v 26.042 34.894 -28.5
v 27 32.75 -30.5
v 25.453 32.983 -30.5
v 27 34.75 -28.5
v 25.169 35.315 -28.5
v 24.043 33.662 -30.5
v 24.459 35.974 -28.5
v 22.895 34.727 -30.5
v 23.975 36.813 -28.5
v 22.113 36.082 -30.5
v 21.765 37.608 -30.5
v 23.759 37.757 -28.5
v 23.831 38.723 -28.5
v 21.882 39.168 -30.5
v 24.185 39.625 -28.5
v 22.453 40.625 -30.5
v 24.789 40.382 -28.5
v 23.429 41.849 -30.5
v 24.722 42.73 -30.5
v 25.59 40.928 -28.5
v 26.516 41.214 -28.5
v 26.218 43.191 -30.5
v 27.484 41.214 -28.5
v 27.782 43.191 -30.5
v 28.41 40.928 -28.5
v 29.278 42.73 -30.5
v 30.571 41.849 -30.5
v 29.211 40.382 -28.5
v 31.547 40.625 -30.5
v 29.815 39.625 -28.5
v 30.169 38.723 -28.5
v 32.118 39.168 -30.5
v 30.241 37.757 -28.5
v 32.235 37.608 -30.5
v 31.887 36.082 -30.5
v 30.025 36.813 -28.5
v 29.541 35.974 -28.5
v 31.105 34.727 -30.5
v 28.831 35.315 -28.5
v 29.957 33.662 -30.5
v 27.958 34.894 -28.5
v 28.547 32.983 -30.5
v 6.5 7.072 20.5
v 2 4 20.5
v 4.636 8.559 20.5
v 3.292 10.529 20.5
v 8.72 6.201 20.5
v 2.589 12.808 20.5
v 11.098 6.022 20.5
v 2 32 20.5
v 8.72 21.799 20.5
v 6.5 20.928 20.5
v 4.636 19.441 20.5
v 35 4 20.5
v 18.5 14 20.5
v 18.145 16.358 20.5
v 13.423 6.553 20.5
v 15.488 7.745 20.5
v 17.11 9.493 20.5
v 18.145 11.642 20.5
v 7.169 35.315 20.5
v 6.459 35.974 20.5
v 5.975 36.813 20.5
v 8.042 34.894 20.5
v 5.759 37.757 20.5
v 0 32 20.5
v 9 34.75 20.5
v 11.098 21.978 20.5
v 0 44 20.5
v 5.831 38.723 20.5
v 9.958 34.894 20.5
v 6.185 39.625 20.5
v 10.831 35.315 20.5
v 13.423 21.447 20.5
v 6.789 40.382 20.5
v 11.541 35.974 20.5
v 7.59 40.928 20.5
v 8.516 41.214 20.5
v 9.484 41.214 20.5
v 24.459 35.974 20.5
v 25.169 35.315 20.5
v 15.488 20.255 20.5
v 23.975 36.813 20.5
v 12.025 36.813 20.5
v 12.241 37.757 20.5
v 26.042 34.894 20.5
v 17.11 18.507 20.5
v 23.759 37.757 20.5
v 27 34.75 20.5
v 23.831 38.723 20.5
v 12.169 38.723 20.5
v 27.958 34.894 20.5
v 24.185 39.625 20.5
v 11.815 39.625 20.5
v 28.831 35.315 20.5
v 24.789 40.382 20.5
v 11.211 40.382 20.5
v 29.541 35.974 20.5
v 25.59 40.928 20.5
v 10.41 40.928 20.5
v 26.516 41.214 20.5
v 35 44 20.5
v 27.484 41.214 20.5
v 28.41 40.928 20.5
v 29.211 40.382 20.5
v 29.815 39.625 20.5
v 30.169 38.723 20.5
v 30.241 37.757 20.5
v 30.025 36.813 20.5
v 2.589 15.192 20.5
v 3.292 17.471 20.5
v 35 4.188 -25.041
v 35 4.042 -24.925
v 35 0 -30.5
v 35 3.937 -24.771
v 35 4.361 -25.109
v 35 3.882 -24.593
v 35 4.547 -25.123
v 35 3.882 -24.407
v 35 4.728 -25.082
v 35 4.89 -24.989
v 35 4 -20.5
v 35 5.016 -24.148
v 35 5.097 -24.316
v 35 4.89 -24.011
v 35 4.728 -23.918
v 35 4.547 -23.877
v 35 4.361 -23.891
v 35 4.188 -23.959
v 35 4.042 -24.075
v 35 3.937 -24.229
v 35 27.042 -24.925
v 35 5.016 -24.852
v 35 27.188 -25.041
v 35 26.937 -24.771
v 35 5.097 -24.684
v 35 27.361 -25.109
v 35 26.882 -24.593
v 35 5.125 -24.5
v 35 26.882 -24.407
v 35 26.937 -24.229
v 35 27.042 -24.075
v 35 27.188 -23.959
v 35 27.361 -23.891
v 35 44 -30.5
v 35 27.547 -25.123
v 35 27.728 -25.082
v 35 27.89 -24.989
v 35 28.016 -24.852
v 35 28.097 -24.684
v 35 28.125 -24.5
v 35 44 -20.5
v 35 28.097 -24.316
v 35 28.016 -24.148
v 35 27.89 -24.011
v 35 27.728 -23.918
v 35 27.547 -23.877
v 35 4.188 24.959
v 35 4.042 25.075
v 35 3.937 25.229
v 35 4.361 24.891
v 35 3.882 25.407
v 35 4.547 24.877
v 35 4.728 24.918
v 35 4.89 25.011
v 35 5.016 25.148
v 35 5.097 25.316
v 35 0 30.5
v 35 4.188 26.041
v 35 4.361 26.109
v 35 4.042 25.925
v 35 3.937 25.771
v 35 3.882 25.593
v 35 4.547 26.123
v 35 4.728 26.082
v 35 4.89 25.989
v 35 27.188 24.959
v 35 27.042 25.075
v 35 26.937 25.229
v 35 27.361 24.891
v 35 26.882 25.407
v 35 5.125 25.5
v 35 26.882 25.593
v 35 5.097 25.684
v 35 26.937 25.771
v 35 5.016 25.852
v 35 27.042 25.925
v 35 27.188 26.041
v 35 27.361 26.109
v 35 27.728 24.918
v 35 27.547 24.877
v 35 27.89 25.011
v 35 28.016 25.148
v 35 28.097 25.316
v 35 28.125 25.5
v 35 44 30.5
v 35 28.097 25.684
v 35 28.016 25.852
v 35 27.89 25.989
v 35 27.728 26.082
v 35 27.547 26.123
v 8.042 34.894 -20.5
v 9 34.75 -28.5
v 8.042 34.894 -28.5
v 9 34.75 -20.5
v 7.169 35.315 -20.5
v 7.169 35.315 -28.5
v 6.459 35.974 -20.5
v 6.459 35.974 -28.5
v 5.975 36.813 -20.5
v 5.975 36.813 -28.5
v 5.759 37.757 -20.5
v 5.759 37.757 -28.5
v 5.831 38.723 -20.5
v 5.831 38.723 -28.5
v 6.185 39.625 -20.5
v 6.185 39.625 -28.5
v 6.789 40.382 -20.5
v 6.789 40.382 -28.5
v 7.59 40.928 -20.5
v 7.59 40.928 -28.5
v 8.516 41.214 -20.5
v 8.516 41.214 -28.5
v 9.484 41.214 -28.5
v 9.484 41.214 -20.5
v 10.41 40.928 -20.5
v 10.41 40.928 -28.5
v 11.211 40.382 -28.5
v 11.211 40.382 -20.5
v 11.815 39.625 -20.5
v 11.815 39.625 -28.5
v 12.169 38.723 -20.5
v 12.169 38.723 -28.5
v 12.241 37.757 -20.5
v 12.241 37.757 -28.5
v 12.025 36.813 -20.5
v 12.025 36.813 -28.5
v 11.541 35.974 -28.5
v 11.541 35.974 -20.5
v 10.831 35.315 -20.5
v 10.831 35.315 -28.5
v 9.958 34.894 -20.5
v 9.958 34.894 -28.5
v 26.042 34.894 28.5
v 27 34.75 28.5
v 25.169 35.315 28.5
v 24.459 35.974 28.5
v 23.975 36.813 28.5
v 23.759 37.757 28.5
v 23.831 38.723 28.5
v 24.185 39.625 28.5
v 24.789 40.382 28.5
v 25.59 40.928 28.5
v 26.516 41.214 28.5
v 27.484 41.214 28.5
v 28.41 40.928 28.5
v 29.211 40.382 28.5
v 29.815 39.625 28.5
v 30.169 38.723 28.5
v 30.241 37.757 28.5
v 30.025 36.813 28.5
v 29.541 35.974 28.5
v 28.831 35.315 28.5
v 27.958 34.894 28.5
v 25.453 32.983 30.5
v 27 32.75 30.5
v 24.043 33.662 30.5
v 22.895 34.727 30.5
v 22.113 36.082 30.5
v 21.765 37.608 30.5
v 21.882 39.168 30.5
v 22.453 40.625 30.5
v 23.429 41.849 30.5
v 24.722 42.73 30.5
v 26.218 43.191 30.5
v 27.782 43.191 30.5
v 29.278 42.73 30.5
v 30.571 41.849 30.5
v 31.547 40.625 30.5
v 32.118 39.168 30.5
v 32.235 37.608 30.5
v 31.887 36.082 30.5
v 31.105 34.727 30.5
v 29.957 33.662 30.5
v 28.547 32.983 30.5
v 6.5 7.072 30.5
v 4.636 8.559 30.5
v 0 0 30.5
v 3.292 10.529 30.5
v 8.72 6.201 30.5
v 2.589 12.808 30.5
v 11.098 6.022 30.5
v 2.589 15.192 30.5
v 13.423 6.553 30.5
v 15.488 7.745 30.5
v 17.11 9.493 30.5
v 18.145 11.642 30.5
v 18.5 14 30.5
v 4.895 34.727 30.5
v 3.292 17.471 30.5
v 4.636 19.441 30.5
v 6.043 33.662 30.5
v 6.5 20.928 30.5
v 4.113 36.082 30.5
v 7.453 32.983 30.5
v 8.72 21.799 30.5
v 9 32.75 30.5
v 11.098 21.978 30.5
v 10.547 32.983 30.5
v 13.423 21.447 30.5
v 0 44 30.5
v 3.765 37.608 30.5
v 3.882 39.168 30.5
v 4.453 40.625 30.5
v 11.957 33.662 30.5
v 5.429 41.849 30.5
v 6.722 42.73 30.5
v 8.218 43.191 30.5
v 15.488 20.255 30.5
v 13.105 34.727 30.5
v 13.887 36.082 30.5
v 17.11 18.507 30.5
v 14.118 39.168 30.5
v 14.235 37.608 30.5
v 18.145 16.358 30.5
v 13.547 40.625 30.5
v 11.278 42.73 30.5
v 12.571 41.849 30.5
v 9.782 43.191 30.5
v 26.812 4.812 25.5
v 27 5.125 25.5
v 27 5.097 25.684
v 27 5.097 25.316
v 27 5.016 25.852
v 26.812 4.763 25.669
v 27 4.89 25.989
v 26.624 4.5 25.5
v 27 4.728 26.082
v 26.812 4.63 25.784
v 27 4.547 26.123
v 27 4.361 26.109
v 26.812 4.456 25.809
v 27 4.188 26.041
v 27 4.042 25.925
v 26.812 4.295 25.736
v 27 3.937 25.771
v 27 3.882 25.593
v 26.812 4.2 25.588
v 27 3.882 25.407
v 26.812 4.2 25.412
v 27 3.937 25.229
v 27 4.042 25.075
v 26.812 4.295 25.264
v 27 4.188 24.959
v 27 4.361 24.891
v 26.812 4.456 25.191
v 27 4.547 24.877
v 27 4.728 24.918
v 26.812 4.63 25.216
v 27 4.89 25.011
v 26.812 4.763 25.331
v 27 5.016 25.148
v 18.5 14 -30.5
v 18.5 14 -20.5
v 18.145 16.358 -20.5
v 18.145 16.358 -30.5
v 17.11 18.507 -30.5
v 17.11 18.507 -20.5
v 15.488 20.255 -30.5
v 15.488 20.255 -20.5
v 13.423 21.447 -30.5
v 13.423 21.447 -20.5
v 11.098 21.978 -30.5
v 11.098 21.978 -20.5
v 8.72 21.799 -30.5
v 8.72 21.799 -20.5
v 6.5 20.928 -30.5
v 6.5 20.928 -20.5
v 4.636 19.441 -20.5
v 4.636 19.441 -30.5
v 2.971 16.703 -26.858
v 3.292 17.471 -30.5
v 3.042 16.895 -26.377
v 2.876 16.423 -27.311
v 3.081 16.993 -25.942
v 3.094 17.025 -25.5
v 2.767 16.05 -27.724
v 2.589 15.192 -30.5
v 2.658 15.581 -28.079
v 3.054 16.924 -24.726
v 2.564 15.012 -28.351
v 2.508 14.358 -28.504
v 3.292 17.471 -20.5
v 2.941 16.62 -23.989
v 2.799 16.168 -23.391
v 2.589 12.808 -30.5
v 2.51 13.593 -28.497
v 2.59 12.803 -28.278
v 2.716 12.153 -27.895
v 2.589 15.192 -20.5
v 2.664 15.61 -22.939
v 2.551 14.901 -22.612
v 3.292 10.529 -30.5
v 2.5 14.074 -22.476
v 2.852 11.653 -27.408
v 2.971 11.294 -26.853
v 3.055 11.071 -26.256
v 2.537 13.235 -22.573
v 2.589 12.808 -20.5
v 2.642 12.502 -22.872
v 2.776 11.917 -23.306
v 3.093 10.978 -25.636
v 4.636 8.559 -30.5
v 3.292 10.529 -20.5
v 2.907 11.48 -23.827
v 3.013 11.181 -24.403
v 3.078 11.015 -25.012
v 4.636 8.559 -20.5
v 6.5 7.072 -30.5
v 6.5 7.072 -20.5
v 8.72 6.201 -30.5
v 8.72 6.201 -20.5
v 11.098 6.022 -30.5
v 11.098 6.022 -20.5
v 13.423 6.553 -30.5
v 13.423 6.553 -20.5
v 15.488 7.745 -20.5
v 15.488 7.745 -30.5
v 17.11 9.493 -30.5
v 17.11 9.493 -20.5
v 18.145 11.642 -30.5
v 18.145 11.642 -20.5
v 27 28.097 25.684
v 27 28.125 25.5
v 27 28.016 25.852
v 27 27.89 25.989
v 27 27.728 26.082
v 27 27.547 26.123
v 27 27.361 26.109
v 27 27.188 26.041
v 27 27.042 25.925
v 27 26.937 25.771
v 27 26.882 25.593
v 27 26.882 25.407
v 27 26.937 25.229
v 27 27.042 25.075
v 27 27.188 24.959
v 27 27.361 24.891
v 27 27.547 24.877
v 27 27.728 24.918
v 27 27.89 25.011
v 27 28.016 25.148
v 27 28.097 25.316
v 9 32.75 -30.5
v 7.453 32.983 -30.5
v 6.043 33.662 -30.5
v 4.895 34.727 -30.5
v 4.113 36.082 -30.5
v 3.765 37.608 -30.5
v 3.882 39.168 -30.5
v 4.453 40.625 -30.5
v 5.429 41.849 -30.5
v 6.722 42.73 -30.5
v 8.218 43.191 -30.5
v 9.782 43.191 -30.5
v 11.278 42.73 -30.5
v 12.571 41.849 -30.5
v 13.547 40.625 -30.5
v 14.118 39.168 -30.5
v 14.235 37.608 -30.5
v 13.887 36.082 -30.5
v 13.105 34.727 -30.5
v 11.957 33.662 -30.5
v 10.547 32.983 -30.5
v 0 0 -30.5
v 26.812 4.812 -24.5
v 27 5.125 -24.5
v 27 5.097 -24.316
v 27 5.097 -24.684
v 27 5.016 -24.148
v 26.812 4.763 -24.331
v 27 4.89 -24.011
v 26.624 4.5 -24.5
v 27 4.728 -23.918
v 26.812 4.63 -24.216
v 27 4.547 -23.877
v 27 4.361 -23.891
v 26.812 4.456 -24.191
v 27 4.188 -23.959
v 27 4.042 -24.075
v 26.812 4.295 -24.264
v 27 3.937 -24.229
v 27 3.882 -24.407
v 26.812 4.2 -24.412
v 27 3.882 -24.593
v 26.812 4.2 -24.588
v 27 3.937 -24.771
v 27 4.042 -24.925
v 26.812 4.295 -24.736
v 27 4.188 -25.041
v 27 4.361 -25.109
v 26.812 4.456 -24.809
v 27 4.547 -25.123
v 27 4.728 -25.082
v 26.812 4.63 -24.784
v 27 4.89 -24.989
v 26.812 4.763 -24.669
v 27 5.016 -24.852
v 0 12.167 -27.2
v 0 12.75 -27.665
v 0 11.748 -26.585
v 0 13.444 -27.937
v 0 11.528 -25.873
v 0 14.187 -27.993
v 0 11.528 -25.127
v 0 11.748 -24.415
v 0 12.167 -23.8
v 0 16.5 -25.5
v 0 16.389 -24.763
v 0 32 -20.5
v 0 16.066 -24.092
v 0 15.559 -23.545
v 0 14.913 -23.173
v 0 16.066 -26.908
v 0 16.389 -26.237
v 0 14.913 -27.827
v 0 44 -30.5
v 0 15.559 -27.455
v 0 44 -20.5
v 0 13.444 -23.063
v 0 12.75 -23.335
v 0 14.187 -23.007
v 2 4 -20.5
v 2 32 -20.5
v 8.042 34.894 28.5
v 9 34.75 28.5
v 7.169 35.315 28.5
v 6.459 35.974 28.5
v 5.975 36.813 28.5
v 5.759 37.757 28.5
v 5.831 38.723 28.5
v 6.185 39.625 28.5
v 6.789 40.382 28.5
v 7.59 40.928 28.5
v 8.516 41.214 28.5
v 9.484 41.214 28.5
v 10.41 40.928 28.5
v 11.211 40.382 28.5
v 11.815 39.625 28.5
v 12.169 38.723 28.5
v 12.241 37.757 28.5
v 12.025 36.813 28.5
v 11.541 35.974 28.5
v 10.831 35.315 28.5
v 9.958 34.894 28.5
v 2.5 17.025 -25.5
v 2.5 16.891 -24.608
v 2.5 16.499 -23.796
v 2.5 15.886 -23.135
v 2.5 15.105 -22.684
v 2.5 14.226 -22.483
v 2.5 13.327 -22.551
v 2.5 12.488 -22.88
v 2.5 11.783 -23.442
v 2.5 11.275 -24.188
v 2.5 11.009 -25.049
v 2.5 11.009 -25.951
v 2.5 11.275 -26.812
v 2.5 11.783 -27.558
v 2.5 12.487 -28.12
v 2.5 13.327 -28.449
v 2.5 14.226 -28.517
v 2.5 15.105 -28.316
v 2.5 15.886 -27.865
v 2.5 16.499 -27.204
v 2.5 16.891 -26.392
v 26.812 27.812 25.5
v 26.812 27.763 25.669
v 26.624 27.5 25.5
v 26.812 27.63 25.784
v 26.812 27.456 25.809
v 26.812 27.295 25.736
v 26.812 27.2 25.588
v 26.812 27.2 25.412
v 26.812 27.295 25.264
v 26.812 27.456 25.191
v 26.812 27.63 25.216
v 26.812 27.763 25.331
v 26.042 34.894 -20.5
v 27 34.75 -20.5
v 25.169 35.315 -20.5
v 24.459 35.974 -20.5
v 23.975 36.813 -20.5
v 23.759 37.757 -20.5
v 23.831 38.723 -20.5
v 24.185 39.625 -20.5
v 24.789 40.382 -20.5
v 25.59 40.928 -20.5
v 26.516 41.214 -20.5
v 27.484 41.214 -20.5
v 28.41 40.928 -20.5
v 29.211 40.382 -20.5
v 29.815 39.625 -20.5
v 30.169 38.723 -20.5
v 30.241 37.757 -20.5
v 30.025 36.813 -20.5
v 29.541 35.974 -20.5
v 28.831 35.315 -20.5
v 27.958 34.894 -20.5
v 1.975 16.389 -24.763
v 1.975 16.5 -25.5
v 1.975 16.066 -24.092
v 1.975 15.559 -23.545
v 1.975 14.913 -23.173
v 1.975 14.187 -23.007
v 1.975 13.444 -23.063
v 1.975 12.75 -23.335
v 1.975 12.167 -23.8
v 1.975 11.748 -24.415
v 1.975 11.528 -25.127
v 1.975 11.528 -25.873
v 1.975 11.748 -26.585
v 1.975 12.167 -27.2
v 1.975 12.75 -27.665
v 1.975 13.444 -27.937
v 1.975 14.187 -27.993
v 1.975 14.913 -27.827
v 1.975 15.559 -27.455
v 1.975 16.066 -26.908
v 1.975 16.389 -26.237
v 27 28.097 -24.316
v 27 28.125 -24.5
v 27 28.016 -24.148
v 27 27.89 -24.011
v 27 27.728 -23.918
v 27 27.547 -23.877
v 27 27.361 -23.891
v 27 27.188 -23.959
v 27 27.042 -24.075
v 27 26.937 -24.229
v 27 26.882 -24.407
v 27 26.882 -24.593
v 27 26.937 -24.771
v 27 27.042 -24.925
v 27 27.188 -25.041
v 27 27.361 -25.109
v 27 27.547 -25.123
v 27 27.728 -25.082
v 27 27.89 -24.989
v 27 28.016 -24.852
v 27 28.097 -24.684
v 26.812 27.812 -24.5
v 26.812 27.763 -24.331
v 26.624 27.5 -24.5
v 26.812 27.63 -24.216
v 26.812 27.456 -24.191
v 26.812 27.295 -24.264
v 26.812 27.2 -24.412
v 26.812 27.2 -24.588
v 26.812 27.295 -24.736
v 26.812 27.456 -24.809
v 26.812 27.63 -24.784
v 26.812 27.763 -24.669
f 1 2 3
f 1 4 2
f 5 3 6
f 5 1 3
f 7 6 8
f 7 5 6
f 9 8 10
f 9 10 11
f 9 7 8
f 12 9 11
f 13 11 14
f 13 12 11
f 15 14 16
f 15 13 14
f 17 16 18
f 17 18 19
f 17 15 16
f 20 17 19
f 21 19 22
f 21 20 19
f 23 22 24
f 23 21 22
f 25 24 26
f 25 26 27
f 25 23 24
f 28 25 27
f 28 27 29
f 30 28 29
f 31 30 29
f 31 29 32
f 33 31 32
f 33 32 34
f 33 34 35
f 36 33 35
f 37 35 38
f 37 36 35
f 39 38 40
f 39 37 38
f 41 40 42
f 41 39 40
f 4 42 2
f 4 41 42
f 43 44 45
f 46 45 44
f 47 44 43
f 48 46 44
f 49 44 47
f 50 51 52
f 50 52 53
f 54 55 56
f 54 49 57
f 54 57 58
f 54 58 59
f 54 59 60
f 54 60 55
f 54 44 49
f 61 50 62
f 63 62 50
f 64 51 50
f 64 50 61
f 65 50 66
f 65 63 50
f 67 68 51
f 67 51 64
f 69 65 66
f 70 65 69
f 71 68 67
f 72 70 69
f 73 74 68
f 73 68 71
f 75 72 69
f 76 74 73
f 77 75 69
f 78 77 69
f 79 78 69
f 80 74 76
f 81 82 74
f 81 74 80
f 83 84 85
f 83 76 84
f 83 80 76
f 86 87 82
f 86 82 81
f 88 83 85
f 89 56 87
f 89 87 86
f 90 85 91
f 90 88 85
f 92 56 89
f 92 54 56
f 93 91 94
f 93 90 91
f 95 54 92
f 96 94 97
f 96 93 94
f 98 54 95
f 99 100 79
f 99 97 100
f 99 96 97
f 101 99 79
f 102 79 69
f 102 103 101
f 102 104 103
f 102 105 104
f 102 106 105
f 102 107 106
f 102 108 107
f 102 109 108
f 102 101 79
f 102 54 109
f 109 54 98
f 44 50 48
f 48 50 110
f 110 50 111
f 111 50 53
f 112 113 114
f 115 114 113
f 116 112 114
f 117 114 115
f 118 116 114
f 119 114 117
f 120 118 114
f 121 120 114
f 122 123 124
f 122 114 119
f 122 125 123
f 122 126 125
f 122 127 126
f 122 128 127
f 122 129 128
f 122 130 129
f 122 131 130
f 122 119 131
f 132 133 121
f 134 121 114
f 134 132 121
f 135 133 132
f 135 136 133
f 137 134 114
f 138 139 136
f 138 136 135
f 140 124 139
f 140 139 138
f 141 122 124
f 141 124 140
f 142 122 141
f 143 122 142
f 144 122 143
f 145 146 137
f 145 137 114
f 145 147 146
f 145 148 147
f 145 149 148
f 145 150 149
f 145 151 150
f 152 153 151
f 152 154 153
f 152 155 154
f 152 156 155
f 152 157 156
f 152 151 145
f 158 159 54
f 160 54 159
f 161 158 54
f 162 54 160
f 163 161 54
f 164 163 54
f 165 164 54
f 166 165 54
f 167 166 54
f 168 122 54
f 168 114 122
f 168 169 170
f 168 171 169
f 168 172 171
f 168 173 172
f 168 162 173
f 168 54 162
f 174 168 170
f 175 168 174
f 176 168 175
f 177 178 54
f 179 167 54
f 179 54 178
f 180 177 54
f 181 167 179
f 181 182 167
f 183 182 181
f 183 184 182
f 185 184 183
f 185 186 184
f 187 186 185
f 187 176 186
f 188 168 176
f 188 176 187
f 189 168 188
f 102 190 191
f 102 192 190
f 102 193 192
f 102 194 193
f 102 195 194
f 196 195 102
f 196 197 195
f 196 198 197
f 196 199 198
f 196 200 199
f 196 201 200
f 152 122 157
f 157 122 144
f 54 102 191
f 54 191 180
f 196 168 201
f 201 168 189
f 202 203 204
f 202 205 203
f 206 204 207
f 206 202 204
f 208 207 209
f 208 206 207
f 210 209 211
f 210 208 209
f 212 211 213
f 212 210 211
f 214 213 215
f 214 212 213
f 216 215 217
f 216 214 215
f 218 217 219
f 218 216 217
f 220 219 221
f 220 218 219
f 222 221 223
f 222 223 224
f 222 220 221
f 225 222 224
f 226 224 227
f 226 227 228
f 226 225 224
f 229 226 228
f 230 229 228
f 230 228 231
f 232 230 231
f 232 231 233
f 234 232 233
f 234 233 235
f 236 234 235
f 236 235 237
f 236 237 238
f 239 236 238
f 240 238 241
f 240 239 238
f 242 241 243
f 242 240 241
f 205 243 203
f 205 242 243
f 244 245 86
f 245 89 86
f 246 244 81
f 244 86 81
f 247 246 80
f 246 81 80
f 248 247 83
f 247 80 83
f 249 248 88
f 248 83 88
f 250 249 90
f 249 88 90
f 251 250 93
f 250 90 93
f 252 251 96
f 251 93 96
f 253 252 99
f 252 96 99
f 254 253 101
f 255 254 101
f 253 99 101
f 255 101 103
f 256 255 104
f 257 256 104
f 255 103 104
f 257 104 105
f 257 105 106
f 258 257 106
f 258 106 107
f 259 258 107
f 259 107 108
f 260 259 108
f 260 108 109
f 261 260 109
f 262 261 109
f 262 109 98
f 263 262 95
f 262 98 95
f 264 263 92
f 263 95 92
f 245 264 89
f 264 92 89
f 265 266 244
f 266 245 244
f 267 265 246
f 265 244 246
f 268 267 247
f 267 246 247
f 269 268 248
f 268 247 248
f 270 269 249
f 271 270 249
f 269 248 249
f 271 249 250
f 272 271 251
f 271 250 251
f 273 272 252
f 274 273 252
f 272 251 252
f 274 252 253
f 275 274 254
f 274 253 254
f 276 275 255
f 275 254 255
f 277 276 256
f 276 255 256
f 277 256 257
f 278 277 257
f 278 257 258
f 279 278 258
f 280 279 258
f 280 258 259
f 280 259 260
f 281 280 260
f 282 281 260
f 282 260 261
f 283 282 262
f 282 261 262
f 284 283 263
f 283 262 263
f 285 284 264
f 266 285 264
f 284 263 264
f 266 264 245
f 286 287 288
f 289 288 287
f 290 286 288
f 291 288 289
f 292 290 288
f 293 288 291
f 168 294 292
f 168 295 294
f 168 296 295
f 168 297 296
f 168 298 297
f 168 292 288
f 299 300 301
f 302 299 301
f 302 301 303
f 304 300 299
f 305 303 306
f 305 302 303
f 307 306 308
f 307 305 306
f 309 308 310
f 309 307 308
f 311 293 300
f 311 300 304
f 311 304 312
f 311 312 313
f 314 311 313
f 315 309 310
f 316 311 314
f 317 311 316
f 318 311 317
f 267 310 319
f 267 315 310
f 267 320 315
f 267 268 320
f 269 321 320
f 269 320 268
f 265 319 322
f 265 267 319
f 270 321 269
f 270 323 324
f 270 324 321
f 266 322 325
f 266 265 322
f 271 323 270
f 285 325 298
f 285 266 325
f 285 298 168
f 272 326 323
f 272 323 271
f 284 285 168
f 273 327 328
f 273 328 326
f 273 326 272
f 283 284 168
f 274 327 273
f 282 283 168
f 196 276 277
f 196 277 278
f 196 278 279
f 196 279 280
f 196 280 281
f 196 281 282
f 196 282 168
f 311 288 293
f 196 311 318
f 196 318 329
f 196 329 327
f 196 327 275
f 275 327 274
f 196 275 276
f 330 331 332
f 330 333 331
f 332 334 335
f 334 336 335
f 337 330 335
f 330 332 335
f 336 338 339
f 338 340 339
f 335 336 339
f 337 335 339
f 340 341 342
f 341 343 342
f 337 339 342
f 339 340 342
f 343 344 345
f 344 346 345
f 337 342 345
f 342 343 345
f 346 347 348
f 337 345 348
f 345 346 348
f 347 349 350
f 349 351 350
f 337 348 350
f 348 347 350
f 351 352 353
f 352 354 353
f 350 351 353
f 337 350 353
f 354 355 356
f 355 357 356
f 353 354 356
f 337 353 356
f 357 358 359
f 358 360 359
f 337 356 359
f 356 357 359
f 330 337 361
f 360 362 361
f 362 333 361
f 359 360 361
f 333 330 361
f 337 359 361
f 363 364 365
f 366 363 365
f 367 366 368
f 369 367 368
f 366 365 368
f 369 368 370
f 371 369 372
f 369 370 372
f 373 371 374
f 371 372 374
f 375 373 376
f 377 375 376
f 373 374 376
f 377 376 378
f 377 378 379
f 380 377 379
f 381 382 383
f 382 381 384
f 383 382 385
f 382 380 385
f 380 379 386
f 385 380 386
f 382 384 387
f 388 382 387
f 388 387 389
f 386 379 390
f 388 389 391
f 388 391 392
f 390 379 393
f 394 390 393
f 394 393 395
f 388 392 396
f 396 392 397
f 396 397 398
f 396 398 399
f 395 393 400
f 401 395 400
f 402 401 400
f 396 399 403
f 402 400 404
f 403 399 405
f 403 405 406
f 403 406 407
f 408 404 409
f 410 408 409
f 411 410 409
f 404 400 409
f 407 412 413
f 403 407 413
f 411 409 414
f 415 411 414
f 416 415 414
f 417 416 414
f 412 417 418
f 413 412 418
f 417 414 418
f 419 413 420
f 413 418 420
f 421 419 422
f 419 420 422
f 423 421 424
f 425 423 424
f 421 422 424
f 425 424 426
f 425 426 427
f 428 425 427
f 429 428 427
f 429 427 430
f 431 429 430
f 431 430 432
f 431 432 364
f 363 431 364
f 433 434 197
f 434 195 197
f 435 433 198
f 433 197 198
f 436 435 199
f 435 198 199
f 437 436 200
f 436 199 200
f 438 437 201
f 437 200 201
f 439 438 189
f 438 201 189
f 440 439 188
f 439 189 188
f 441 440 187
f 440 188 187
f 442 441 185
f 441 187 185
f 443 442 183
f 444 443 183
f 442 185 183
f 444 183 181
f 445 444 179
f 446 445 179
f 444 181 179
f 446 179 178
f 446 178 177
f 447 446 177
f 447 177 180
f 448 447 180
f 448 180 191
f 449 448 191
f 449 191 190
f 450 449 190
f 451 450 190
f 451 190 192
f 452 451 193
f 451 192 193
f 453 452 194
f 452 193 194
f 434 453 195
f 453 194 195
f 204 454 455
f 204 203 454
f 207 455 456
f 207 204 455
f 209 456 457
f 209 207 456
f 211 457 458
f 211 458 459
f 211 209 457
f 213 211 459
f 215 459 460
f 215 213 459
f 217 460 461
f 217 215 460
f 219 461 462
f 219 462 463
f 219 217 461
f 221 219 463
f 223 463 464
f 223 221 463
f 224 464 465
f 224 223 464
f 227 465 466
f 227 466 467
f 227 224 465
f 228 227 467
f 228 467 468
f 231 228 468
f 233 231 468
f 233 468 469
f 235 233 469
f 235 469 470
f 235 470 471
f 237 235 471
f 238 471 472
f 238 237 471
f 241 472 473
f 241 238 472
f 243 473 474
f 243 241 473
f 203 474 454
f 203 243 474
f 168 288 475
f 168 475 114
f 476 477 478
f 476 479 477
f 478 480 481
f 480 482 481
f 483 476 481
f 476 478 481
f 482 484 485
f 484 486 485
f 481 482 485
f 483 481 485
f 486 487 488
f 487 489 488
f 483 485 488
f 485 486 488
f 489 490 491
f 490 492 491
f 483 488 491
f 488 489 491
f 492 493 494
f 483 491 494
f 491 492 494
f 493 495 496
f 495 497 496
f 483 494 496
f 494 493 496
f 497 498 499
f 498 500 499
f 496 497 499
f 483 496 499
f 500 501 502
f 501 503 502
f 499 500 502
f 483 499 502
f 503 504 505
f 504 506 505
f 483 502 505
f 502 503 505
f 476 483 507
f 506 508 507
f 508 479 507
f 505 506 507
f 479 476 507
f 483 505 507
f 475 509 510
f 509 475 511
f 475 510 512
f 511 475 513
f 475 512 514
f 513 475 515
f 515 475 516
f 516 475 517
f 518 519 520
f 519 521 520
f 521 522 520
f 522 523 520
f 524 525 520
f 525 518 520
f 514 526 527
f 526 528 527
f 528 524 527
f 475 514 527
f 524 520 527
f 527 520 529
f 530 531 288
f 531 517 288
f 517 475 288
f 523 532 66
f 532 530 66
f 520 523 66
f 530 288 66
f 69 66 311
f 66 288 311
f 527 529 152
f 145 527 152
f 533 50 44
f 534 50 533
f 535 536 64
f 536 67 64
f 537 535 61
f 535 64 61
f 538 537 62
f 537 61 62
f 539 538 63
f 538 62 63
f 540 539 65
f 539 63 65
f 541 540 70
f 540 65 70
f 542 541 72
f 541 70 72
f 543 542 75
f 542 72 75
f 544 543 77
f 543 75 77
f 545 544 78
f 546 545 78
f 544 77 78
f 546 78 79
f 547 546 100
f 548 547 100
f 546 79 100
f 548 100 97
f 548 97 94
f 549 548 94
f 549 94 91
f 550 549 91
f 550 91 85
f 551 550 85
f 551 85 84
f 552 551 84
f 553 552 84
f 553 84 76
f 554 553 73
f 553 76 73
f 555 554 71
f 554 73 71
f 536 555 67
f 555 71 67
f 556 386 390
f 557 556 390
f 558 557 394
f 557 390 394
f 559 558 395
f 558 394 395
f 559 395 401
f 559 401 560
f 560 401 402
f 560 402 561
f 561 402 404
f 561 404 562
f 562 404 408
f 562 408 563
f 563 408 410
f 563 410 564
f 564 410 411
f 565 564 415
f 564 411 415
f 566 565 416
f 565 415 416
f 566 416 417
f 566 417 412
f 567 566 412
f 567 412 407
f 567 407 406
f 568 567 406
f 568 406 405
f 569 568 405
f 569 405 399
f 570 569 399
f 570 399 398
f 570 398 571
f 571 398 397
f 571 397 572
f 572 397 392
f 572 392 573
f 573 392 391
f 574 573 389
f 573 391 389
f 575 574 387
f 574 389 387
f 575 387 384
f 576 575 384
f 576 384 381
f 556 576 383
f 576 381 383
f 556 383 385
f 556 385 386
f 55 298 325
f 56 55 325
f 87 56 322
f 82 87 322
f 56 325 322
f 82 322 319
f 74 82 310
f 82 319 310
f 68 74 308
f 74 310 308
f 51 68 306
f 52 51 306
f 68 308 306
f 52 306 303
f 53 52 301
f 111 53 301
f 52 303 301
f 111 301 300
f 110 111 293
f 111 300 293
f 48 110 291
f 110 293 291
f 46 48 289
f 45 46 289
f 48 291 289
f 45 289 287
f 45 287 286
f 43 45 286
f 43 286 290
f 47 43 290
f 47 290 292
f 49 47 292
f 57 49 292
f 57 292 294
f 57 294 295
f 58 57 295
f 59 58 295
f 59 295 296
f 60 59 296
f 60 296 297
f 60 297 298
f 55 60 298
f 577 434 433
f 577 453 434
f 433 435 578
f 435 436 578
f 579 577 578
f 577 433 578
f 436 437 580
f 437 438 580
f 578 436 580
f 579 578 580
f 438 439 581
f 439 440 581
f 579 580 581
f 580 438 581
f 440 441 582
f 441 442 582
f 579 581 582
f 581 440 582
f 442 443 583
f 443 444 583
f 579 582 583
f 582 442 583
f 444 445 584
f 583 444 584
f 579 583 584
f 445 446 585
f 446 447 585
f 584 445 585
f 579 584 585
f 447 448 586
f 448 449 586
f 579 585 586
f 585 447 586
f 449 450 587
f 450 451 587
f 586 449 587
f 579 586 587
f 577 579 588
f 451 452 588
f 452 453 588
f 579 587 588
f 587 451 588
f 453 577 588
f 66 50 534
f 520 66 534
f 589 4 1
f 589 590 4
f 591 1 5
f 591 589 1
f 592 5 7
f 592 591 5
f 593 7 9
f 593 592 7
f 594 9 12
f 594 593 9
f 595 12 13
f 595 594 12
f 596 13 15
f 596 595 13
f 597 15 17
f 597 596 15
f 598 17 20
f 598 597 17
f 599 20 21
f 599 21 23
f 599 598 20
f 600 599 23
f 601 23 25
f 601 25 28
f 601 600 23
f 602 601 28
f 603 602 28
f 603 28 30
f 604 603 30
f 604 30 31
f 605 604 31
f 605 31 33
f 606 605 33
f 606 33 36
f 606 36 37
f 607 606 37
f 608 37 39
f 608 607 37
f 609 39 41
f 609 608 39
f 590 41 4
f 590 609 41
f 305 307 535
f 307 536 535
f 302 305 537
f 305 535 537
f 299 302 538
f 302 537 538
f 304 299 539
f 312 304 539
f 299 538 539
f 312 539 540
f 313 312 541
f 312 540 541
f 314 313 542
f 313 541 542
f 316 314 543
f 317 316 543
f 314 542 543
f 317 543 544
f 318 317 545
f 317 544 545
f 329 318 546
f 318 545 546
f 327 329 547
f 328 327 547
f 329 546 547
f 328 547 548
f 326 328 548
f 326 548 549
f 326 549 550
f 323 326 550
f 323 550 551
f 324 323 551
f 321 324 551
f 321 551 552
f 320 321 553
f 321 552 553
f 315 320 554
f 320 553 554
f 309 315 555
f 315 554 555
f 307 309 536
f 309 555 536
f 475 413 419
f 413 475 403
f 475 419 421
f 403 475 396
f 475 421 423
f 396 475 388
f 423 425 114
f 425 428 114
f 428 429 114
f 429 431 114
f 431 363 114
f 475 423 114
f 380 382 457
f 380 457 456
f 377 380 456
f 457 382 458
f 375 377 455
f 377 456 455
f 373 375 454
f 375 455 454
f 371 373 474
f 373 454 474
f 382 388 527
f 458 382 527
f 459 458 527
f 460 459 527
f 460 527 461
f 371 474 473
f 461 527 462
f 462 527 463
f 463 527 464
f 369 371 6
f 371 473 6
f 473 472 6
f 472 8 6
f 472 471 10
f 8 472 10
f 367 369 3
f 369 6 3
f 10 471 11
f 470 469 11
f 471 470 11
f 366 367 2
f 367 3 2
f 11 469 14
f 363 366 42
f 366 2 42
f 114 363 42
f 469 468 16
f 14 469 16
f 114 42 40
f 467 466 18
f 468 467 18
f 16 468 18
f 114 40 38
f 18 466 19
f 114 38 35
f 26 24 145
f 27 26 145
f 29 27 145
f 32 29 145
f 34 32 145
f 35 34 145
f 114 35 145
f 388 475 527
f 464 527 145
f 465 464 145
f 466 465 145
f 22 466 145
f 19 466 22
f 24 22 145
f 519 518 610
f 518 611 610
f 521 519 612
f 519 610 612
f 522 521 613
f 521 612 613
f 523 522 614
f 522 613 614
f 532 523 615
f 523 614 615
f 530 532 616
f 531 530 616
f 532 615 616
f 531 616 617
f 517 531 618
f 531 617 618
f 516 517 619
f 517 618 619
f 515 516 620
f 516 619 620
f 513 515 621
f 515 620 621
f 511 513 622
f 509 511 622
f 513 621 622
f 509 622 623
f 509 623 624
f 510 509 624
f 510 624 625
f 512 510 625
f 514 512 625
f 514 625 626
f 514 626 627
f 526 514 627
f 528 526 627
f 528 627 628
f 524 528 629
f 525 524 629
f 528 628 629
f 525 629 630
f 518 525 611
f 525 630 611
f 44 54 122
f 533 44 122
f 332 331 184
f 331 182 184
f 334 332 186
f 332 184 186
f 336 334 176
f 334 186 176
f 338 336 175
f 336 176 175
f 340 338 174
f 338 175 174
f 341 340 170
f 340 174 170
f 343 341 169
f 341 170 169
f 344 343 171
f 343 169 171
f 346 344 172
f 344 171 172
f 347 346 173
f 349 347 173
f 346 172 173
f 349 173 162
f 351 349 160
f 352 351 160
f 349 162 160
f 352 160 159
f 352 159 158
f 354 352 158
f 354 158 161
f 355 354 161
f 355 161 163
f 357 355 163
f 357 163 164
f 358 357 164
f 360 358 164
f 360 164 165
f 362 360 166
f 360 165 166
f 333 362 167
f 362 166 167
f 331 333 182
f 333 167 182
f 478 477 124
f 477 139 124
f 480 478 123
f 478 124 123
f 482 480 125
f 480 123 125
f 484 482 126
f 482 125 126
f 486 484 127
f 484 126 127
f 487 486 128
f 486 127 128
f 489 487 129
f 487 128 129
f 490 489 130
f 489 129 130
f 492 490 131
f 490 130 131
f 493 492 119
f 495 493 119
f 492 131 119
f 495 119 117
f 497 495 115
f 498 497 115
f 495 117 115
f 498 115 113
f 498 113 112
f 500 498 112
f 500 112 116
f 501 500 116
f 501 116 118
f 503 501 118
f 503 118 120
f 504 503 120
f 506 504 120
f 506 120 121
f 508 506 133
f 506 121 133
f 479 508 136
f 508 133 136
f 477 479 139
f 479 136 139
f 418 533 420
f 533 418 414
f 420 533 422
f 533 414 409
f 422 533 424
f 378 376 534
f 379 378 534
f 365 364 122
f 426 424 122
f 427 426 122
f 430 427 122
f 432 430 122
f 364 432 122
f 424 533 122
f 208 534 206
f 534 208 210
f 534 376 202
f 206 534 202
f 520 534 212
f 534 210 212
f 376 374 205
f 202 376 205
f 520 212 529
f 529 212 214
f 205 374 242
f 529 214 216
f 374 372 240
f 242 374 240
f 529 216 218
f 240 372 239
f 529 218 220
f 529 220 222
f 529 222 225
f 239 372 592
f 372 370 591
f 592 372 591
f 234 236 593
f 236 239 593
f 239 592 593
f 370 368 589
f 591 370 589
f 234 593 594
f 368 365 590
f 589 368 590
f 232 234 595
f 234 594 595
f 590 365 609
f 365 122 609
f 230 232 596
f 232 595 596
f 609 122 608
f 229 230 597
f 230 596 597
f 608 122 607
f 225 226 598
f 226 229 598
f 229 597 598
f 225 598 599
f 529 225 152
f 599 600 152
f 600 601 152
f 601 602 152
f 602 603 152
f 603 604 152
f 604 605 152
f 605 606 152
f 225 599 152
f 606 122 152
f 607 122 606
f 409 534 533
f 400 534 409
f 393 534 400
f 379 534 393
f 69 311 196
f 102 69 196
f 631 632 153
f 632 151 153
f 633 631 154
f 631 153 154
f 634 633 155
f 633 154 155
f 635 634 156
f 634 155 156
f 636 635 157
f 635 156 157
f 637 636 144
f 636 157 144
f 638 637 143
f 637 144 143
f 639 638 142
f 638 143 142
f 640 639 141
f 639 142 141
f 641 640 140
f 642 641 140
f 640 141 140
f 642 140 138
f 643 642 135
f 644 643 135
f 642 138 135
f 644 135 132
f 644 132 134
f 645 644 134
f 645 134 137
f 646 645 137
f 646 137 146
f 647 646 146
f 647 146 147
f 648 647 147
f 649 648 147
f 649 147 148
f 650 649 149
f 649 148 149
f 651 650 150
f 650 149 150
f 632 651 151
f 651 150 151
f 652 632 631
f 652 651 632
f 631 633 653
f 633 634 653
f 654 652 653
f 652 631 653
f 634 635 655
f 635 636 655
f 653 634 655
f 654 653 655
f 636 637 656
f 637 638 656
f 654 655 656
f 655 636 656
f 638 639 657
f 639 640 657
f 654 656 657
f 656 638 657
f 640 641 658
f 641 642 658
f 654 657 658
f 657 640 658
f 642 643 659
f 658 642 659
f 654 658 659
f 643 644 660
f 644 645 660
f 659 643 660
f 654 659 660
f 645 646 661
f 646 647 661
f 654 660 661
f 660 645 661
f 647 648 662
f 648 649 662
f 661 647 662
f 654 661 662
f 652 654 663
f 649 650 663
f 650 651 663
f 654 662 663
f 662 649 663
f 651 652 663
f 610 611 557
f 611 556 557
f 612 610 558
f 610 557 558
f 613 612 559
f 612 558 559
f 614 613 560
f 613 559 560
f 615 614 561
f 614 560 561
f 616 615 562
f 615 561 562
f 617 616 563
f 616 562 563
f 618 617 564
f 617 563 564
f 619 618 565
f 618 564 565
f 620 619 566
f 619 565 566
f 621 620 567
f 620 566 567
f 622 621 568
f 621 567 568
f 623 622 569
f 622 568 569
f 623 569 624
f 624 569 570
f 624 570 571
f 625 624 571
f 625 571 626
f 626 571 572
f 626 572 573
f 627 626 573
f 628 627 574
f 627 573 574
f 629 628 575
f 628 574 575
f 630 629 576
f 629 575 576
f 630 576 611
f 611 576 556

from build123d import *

# Parameters (mm, degrees)
SKETCH_1_W                       = 35
SKETCH_1_H                       = 44
EXTRUDE_1_DEPTH                  = 30.5
SKETCH_3_W                       = 41
SKETCH_3_H                       = 40
CUT_EXTRUDE_1_DEPTH              = 33
SKETCH_4_W                       = 41
SKETCH_4_H                       = 12
CUT_EXTRUDE_2_DEPTH              = 33
SKETCH_5_R                       = 8
CUT_EXTRUDE_3_DEPTH              = 83.957820608
HOLE_WIZARD_6_5_6_5_1_AT_2_COUNT = 2
HOLE_WIZARD_6_5_6_5_1_AT_2_PITCH = 18


# Read off the part's stored shape, not the designer's step: M1.6 螺纹孔1, M6 螺纹孔1
with BuildPart() as part:
    # 草图1 → 凸台-拉伸1 (new, symmetric)
    with BuildSketch(Plane.XY):
        with Locations((17.5, 22)):
            Rectangle(SKETCH_1_W, SKETCH_1_H)
    extrude(amount=EXTRUDE_1_DEPTH, both=True)

    # 草图3 → 切除-拉伸1 (cut)
    with BuildSketch(Plane(origin=(35, 0, 0), x_dir=(0, 0, -1), z_dir=(1, 0, 0))):
        with Locations((0, 24)):
            Rectangle(SKETCH_3_W, SKETCH_3_H)
    extrude(amount=-CUT_EXTRUDE_1_DEPTH, mode=Mode.SUBTRACT)

    # 草图4 → 切除-拉伸2 (cut)
    with BuildSketch(Plane(origin=(2, 0, 0), x_dir=(0, 0, -1), z_dir=(1, 0, 0))):
        with Locations((0, 38)):
            Rectangle(SKETCH_4_W, SKETCH_4_H)
    extrude(amount=-CUT_EXTRUDE_2_DEPTH, mode=Mode.SUBTRACT)

    # 草图5 → 切除-拉伸3 (cut, through all)
    with BuildSketch(Plane.XY.offset(30.5)):
        with Locations((10.5, 14)):
            Circle(SKETCH_5_R)
    extrude(amount=-CUT_EXTRUDE_3_DEPTH, mode=Mode.SUBTRACT)

    # 草图7 → Ø6.5 (6.5) 直径孔1 (revolve, cut)
    with BuildSketch(Plane(origin=(9, 38, -20.5), x_dir=(0, -1, 0), z_dir=(1, 0, 0))):
        Polygon((0, 0), (0, 10), (5.25, 10), (3.25, 8), (3.25, 0), align=None)
    hole_wizard_6_5_6_5_1 = revolve(axis=Axis((9, 38, -14.15), (0, 0, -1)), mode=Mode.SUBTRACT)

    # Ø6.5 (6.5) 直径孔1 at 2: Ø6.5 (6.5) 直径孔1 ×2
    with Locations(*[(i * HOLE_WIZARD_6_5_6_5_1_AT_2_PITCH, 0, 0) for i in range(1, HOLE_WIZARD_6_5_6_5_1_AT_2_COUNT)]):
        add(hole_wizard_6_5_6_5_1, mode=Mode.SUBTRACT)

    # 镜向1: Ø6.5 (6.5) 直径孔1 across plane
    add(hole_wizard_6_5_6_5_1.mirror(Plane.XY), mode=Mode.SUBTRACT)

    # 镜向1 copy 1 sketch → 镜向1 copy 1 (revolve, cut)
    with BuildSketch(Plane(origin=(27, 38, 20.5), x_dir=(0, -1, 0), z_dir=(1, 0, 0))):
        Polygon((0, 0), (0, -10), (5.25, -10), (3.25, -8), (3.25, 0), align=None)
    revolve(axis=Axis((27, 38, 14.15), (0, 0, -1)), mode=Mode.SUBTRACT)

    # M1.6 螺纹孔1 outline → M1.6 螺纹孔1 (revolve, cut)
    with BuildSketch(Plane(origin=(0, 27.5, 25.5), x_dir=(0, 1, 0), z_dir=(0, 0, -1))):
        Polygon((0, 35), (0, 26.624462113), (0.625, 27), (0.625, 35), align=None)
    revolve(axis=Axis((0, 27.5, 25.5), (1, 0, 0)), mode=Mode.SUBTRACT)

    # Hole Wizard M1.6 _1 2 outline → Hole Wizard M1.6 _1 2 (revolve, cut)
    with BuildSketch(Plane(origin=(0, 4.5, -24.5), x_dir=(0, 1, 0), z_dir=(0, 0, -1))):
        Polygon((0, 35), (0, 26.624462113), (0.625, 27), (0.625, 35), align=None)
    revolve(axis=Axis((0, 4.5, -24.5), (1, 0, 0)), mode=Mode.SUBTRACT)

    # Hole Wizard M1.6 _1 3 outline → Hole Wizard M1.6 _1 3 (revolve, cut)
    with BuildSketch(Plane(origin=(0, 27.5, -24.5), x_dir=(0, 1, 0), z_dir=(0, 0, -1))):
        Polygon((0, 35), (0, 26.624462113), (0.625, 27), (0.625, 35), align=None)
    revolve(axis=Axis((0, 27.5, -24.5), (1, 0, 0)), mode=Mode.SUBTRACT)

    # Hole Wizard M1.6 _1 4 outline → Hole Wizard M1.6 _1 4 (revolve, cut)
    with BuildSketch(Plane(origin=(0, 4.5, 25.5), x_dir=(0, 1, 0), z_dir=(0, 0, -1))):
        Polygon((0, 35), (0, 26.624462113), (0.625, 27), (0.625, 35), align=None)
    revolve(axis=Axis((0, 4.5, 25.5), (1, 0, 0)), mode=Mode.SUBTRACT)

    # M6 螺纹孔1 outline → M6 螺纹孔1 (revolve, cut)
    with BuildSketch(Plane(origin=(0, 14, -25.5), x_dir=(0, 1, 0), z_dir=(0, 0, -1))):
        Polygon((3.025, 2.499998942), (3.025, 3.094213479), (2.5, 3.094219892), (2.5, 1.975), align=None)
        Polygon((2.5, 1.975), (2.5, 3.094219892), (0, 3.094219892), (0, 0), (2.5, 0), align=None)
    revolve(axis=Axis((0, 14, -25.5), (1, 0, 0)), mode=Mode.SUBTRACT)


solid = part.part
